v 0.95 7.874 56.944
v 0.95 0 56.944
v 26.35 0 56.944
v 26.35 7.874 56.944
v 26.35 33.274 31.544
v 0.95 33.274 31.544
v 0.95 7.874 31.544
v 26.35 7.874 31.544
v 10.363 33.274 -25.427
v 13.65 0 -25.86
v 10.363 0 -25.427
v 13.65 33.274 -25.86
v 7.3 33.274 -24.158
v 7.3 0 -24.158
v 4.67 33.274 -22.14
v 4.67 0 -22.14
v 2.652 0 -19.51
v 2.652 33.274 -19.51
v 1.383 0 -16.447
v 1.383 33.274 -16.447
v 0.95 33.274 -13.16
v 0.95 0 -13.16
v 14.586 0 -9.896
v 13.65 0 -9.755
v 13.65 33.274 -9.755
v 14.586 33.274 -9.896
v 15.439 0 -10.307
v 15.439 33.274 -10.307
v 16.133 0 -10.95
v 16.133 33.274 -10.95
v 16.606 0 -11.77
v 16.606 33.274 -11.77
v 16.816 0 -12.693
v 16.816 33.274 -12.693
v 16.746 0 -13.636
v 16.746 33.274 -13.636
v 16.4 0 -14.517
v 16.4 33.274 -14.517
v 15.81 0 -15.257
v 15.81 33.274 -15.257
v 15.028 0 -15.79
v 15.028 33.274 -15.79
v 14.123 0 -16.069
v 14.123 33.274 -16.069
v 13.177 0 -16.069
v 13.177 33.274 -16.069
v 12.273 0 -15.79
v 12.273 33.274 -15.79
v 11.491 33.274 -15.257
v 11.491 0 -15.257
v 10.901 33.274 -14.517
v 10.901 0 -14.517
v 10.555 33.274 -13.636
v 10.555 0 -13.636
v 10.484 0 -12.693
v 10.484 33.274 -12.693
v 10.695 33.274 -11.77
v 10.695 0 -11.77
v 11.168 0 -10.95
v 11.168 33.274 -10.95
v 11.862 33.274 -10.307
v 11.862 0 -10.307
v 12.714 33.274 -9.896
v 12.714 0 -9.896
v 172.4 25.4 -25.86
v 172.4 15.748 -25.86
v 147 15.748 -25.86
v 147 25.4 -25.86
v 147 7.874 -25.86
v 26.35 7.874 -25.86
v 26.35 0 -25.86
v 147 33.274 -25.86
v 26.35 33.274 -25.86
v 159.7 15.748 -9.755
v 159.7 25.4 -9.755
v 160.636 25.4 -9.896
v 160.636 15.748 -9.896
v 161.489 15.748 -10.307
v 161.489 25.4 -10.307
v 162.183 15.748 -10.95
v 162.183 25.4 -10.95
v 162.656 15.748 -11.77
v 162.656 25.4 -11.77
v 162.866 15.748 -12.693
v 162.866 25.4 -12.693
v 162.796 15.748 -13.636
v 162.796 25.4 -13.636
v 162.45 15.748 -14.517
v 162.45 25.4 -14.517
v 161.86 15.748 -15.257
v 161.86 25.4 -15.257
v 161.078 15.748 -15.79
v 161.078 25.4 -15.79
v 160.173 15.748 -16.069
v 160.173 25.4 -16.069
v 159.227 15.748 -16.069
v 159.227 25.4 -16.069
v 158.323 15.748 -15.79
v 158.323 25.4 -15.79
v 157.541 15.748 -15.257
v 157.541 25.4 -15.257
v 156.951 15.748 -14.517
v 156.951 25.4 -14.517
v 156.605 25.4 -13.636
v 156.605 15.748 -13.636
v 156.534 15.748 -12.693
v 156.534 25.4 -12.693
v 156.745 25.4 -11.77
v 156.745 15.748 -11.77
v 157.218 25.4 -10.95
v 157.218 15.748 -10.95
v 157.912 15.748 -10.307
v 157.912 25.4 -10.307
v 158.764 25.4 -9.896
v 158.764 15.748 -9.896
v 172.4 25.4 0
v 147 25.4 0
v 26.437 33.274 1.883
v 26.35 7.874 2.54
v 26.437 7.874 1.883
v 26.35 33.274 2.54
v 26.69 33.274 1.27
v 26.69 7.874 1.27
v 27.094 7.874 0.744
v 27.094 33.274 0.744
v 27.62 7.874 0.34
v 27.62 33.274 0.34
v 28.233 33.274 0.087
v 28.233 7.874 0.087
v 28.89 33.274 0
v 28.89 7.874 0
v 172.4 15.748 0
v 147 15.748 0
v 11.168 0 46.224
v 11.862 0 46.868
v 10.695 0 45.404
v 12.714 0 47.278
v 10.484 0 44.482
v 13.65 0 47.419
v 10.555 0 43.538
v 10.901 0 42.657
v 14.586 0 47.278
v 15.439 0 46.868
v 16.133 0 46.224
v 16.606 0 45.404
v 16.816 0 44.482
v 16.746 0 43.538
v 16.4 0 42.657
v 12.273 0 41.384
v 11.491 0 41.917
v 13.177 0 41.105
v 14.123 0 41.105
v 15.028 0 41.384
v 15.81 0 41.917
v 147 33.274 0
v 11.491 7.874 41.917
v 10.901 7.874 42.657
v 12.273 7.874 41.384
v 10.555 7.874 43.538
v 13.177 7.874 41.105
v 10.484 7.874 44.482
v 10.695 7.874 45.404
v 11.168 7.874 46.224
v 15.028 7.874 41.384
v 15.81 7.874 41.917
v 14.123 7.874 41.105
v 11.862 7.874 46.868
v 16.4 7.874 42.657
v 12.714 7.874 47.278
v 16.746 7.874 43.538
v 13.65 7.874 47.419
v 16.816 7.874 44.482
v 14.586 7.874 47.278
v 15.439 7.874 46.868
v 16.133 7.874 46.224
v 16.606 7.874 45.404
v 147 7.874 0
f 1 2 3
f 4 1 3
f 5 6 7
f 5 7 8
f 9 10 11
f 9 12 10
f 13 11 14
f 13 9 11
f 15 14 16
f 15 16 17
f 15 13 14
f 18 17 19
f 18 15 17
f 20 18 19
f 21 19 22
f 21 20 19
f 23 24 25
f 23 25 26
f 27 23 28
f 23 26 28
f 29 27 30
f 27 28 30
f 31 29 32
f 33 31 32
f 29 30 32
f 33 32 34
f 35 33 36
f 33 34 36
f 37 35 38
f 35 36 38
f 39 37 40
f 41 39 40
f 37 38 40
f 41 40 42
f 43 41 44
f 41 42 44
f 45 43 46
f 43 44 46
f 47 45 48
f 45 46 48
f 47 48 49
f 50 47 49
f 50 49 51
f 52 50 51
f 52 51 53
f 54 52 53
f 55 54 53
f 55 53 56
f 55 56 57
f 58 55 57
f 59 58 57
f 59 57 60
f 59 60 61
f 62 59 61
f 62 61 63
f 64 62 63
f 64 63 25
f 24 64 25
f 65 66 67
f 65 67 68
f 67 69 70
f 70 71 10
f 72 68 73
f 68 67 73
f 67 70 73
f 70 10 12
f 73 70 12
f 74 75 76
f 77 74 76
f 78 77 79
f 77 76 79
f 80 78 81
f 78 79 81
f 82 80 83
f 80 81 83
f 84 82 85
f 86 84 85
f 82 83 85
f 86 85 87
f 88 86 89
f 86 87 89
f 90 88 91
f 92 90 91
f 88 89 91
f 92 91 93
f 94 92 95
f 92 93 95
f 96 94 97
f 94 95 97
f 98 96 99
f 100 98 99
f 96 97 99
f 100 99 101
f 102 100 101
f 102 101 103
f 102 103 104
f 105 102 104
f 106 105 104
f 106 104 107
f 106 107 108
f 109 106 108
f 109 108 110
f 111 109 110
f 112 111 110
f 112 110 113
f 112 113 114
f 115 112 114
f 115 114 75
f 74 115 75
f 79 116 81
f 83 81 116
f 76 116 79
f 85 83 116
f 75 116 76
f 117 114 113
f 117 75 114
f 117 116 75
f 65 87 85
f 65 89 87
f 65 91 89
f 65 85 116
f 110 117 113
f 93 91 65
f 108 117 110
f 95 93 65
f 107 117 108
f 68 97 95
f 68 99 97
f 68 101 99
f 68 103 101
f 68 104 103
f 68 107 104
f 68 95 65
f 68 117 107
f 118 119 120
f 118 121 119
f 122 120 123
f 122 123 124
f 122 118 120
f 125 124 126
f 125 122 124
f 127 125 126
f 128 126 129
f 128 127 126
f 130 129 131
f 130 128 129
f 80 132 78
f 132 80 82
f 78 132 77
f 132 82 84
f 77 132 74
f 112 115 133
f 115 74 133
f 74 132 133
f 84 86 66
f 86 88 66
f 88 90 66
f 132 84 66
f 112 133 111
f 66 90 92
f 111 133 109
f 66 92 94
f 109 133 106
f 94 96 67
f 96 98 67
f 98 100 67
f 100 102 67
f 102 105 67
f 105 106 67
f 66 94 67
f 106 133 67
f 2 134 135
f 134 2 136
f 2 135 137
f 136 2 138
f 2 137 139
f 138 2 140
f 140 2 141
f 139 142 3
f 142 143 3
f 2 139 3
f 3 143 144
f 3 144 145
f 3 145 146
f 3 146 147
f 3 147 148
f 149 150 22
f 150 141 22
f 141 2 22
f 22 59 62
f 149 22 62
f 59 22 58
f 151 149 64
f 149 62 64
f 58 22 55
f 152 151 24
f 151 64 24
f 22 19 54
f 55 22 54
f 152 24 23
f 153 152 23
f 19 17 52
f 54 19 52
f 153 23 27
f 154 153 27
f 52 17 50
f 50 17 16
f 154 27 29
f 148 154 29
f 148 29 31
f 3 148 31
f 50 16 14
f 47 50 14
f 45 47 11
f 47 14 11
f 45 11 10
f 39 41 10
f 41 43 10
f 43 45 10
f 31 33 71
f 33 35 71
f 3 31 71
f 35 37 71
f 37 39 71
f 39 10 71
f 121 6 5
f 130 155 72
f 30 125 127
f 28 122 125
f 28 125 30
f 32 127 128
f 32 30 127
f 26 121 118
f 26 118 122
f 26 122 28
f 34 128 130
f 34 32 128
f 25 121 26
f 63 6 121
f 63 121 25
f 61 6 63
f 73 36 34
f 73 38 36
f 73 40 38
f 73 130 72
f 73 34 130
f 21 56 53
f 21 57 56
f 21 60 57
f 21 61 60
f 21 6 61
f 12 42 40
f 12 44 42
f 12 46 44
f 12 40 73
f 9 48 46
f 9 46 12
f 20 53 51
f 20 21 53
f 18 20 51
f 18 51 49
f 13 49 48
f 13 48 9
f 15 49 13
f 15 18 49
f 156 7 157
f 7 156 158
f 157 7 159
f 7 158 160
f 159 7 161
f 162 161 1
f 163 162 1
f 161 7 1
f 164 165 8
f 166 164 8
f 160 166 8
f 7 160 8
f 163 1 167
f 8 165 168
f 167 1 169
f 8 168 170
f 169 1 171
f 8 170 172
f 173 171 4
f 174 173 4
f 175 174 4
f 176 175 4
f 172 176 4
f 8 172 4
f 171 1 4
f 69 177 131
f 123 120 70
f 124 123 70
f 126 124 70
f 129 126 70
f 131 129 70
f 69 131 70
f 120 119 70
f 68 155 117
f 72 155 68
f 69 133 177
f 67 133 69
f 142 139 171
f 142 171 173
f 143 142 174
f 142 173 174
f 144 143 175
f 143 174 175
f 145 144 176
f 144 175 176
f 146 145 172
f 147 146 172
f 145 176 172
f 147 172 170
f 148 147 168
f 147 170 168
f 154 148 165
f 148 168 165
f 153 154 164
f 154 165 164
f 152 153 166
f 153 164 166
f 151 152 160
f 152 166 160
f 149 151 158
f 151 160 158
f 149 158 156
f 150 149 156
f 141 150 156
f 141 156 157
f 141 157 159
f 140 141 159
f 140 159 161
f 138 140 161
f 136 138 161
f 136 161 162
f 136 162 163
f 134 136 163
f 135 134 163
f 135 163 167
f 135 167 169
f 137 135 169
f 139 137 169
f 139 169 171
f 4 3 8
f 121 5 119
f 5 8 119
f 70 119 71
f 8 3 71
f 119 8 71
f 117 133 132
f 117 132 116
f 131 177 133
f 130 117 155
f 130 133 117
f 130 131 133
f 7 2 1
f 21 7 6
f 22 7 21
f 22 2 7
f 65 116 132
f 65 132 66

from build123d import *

# Parameters (mm, degrees)
SKETCH1_W           = 25.4
SKETCH1_H           = 82.804
BOSS_EXTRUDE1_DEPTH = 33.274
SKETCH3_W           = 25.859634715
SKETCH3_H           = 25.4
BOSS_EXTRUDE2_DEPTH = 120.65
SKETCH4_W           = 25.4
SKETCH4_H           = 25.4
CUT_EXTRUDE2_DEPTH  = 25.4
SKETCH5_W           = 25.859634715
SKETCH5_H           = 9.652
BOSS_EXTRUDE3_DEPTH = 25.4
SKETCH7_R           = 3.175
CUT_EXTRUDE4_DEPTH  = 41.402
SKETCH8_R           = 3.175
CUT_EXTRUDE5_DEPTH  = 25.4
SKETCH6_R           = 3.175
CUT_EXTRUDE3_DEPTH  = 41.402
FILLET1_R           = 12.7
FILLET2_R           = 2.54


with BuildPart() as part:
    # Sketch1 → Boss-Extrude1 (new body)
    with BuildSketch(Plane(origin=(0, 0, 0), x_dir=(1, 0, 0), z_dir=(0, 1, 0))):
        with Locations((13.650196891, -15.542365285)):
            Rectangle(SKETCH1_W, SKETCH1_H)
    extrude(amount=BOSS_EXTRUDE1_DEPTH)

    # Sketch3 → Boss-Extrude2 (add)
    with BuildSketch(Plane(origin=(26.350196891, 0, 0), x_dir=(0, 0, -1), z_dir=(1, 0, 0))):
        with Locations((12.929817358, 20.574)):
            Rectangle(SKETCH3_W, SKETCH3_H)
    extrude(amount=BOSS_EXTRUDE2_DEPTH)

    # Sketch4 → Cut-Extrude2 (cut)
    with BuildSketch(Plane.XY.offset(56.944365285)):
        with Locations((13.650196891, 20.574)):
            Rectangle(SKETCH4_W, SKETCH4_H)
    extrude(amount=-CUT_EXTRUDE2_DEPTH, mode=Mode.SUBTRACT)

    # Sketch5 → Boss-Extrude3 (add)
    with BuildSketch(Plane(origin=(147.000196891, 0, 0), x_dir=(0, 0, -1), z_dir=(1, 0, 0))):
        with Locations((12.929817358, 20.574)):
            Rectangle(SKETCH5_W, SKETCH5_H)
    extrude(amount=BOSS_EXTRUDE3_DEPTH)

    # Sketch7 → Cut-Extrude4 (cut)
    with BuildSketch(Plane(origin=(0, 25.4, 0), x_dir=(1, 0, 0), z_dir=(0, 1, 0))):
        with Locations(Location((159.700196891, 12.929817358, 0), (0, 0, 270))):
            Circle(SKETCH7_R)
    extrude(amount=-CUT_EXTRUDE4_DEPTH, mode=Mode.SUBTRACT)

    # Sketch8 → Cut-Extrude5 (cut)
    with BuildSketch(Plane(origin=(0, 7.874, 0), x_dir=(1, 0, 0), z_dir=(0, 1, 0))):
        with Locations(Location((13.650196891, -44.244365285, 0), (0, 0, 270))):
            Circle(SKETCH8_R)
    extrude(amount=-CUT_EXTRUDE5_DEPTH, mode=Mode.SUBTRACT)

    # Sketch6 → Cut-Extrude3 (cut)
    with BuildSketch(Plane(origin=(0, 33.274, 0), x_dir=(1, 0, 0), z_dir=(0, 1, 0))):
        with Locations(Location((13.650196891, 12.929817358, 0), (0, 0, 270))):
            Circle(SKETCH6_R)
    extrude(amount=-CUT_EXTRUDE3_DEPTH, mode=Mode.SUBTRACT)

    # Fillet1
    fillet1_edges = [part.edges().sort_by_distance(p)[0] for p in [
        (0.950196891, 16.637, -25.859634715),
    ]]
    fillet(fillet1_edges, radius=FILLET1_R)

    # Fillet2
    fillet2_edges = [part.edges().sort_by_distance(p)[0] for p in [
        (26.350196891, 20.574, 0),
    ]]
    fillet(fillet2_edges, radius=FILLET2_R)


solid = part.part
